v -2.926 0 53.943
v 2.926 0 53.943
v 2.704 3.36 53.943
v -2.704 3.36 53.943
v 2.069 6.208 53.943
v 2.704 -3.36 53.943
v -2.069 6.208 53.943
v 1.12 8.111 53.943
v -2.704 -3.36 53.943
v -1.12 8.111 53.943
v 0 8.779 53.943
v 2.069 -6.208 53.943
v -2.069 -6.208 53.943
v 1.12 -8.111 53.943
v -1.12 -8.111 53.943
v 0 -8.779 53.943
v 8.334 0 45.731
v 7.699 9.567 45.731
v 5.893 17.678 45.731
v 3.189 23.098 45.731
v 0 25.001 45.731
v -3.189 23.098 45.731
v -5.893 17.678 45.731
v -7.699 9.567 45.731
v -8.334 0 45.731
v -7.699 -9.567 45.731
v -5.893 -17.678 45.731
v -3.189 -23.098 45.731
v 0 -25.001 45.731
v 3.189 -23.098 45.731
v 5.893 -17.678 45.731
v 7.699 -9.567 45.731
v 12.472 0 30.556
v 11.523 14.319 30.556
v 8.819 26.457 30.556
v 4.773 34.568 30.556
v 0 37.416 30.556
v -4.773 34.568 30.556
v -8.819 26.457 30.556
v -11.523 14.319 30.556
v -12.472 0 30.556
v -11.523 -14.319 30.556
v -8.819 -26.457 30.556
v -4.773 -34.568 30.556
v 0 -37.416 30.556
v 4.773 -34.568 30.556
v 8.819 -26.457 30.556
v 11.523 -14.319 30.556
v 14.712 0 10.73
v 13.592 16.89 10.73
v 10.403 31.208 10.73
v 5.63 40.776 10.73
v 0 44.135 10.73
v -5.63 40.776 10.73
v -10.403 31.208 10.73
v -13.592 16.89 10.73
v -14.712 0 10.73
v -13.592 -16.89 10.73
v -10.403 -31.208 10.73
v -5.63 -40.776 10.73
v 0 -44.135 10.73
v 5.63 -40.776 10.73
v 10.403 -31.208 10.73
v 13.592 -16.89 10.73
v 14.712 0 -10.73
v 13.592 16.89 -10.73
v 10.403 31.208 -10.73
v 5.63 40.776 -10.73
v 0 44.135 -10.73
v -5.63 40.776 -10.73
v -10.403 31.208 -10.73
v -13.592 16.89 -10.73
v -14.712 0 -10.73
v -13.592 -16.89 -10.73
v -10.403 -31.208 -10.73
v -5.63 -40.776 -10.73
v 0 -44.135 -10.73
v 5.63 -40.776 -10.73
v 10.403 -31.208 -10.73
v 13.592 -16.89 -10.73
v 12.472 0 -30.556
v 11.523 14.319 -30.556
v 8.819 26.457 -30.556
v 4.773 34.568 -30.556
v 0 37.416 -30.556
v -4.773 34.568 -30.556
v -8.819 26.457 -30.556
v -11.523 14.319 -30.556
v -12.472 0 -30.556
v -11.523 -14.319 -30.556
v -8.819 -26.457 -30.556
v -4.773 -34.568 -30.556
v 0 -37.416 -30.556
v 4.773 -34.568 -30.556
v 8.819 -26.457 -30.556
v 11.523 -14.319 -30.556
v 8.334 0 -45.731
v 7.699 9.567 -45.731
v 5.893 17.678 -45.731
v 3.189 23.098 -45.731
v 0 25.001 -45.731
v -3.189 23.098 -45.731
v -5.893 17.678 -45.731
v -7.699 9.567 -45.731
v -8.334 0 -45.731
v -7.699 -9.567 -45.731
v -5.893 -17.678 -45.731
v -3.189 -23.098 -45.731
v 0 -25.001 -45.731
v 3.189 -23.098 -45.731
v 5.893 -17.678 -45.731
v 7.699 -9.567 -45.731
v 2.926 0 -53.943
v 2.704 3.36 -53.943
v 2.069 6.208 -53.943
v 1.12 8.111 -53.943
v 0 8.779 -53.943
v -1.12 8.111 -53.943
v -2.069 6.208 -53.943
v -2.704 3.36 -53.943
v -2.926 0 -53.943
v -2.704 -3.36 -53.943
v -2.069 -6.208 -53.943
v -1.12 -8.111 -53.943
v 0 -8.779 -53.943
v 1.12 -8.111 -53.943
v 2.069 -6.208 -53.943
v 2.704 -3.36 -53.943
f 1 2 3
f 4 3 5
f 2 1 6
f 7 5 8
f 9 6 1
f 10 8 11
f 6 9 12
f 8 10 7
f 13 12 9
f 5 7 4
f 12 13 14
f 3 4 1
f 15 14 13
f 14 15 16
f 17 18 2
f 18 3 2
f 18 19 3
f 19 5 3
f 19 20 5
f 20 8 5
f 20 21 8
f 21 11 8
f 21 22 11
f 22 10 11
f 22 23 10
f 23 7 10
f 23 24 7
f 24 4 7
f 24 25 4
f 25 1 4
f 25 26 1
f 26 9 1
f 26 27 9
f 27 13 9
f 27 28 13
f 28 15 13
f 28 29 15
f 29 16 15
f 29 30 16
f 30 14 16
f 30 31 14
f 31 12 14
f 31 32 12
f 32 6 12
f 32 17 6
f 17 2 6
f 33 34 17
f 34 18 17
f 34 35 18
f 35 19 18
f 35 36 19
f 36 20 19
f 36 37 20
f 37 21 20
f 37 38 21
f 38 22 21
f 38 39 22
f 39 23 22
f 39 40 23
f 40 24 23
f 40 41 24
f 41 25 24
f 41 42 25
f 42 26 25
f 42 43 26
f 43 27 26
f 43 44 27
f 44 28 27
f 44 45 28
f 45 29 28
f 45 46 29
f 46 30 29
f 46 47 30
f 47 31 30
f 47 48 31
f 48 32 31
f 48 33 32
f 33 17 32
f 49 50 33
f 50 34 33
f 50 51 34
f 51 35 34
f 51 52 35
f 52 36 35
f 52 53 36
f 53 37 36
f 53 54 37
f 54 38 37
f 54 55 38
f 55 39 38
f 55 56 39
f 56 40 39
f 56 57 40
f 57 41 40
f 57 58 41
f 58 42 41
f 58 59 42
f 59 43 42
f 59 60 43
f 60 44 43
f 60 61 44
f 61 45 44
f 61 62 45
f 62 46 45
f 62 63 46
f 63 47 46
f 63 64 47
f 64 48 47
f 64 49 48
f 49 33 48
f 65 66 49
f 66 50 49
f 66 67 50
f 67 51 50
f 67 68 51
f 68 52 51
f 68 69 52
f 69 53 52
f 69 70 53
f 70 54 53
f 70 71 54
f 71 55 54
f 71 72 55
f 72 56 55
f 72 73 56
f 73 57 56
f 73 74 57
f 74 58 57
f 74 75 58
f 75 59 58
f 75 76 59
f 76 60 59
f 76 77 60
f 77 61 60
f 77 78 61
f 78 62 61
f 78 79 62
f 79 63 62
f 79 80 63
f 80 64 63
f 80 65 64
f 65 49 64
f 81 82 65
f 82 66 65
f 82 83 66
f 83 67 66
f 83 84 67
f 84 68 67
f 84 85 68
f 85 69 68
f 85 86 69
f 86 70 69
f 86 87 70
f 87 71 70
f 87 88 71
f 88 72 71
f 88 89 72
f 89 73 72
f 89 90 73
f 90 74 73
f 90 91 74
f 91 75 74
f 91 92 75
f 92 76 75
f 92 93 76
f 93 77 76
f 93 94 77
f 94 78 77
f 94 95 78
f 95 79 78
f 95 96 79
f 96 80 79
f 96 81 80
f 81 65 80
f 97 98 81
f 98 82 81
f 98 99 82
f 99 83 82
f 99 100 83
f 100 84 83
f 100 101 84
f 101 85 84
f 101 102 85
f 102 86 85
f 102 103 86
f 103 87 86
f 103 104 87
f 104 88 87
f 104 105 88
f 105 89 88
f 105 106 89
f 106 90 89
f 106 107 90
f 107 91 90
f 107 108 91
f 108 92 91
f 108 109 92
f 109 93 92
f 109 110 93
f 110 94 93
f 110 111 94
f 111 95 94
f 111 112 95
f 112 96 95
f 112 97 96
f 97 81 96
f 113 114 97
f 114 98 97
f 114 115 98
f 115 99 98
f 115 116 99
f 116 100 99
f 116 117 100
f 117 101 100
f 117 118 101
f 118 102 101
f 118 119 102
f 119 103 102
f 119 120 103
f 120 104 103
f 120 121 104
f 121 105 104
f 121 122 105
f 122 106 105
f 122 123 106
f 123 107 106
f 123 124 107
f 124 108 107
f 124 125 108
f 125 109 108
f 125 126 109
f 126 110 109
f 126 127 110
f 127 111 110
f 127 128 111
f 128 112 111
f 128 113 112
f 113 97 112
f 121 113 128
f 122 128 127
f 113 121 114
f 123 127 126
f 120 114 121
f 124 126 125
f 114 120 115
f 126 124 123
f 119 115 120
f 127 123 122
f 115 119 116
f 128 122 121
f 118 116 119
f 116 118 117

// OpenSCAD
// Generated by SolidPython 1.0.1 on 2020-07-29 00:46:45


scale(v = [3, 9, 11]) {
	sphere(r = 5);
}
/***********************************************
*********      SolidPython code:      **********
************************************************
 
# import packages: SolidPython
from solid import *
from solid.utils import *
from itertools import chain, combinations, permutations


class Resize:

    def __init__(self, scad_file):
        self.scad_file = scad_file
        #self.scad_file = import_scad(scad_file)
        # cone/cylinder param:
        self.r1 = 0
        self.r2 = 0
        self.h = 0
        # rectangular prism param:
        self.w = 0
        self.l = 0
        # ellipse param:
        self.r = 0

    # import OpenScad code (file name corresponds to shape)


    # classify shape + parameters
    def assign(self, param1, param2, param3):
        if self.scad_file == 'cone.scad':
            self.r1 = param1
            self.r2 = param2
            self.h = param3
        elif self.scad_file == 'cylinder.scad':
            self.r1 = param1
            self.r2 = param2
            self.h = param3
        elif self.scad_file == 'rectangularPrism.scad':
            self.h = param1
            self.l = param2
            self.w = param3
        else:
            self.r = param1
            self.h = param2

    # resize parameters
    def iterate(self):
        x = range(3, 20, 2)
        i = 1
        if self.scad_file == 'cone.scad':
            tempList = list(permutations(x, 2))
            for temp in tempList:
                param1 = temp[0]
                param2 = temp[1]
                filepath = 'produced_scad_files/' + 'cone' + str(param1) + '_' + str(param2) + '_' + '.scad'
                scad_render_to_file(cylinder(h=param1, r1=param2, r2=0), filepath)

        elif self.scad_file == 'cylinder.scad':
            tempList = list(permutations(x, 3))
            for temp in tempList:
                param1 = temp[0]
                param2 = temp[1]
                filepath = 'produced_scad_files/' + 'cylinder' + str(param1) + '_' + str(param2) + '_' + '.scad'
                scad_render_to_file(cylinder(h=param1, r1=param2, r2=param2), filepath)

        elif self.scad_file == 'rectangularPrism.scad':
            tempList = list(permutations(x, 3))
            for temp in tempList:
                param1 = temp[0]
                param2 = temp[1]
                param3 = temp[2]
                filepath = 'produced_scad_files/' + 'rectangularPrism' + str(param1) + '_' + str(param2) + '_' + str(
                    param3) + '.scad'
                scad_render_to_file(cube(size=(param1, param2, param3)), filepath)

        elif self.scad_file == 'ellipse.scad':
            tempList = list(permutations(x, 4))
            for temp in tempList:
                param1 = temp[0]
                param2 = temp[1]
                param3 = temp[2]
                param4 = temp[3]
                filepath = 'produced_scad_files/' + 'ellipse' + str(param1) + '_' + str(param2) + '_' + str(param3) + '_' + str(param4) + '.scad'
                scad_render_to_file(scale([param1, param2, param3])(sphere(r=param4)), filepath)

    def render_to_scadfile(self):
        scad_render_to_file(scad, 'example.scad') 
 
************************************************/
